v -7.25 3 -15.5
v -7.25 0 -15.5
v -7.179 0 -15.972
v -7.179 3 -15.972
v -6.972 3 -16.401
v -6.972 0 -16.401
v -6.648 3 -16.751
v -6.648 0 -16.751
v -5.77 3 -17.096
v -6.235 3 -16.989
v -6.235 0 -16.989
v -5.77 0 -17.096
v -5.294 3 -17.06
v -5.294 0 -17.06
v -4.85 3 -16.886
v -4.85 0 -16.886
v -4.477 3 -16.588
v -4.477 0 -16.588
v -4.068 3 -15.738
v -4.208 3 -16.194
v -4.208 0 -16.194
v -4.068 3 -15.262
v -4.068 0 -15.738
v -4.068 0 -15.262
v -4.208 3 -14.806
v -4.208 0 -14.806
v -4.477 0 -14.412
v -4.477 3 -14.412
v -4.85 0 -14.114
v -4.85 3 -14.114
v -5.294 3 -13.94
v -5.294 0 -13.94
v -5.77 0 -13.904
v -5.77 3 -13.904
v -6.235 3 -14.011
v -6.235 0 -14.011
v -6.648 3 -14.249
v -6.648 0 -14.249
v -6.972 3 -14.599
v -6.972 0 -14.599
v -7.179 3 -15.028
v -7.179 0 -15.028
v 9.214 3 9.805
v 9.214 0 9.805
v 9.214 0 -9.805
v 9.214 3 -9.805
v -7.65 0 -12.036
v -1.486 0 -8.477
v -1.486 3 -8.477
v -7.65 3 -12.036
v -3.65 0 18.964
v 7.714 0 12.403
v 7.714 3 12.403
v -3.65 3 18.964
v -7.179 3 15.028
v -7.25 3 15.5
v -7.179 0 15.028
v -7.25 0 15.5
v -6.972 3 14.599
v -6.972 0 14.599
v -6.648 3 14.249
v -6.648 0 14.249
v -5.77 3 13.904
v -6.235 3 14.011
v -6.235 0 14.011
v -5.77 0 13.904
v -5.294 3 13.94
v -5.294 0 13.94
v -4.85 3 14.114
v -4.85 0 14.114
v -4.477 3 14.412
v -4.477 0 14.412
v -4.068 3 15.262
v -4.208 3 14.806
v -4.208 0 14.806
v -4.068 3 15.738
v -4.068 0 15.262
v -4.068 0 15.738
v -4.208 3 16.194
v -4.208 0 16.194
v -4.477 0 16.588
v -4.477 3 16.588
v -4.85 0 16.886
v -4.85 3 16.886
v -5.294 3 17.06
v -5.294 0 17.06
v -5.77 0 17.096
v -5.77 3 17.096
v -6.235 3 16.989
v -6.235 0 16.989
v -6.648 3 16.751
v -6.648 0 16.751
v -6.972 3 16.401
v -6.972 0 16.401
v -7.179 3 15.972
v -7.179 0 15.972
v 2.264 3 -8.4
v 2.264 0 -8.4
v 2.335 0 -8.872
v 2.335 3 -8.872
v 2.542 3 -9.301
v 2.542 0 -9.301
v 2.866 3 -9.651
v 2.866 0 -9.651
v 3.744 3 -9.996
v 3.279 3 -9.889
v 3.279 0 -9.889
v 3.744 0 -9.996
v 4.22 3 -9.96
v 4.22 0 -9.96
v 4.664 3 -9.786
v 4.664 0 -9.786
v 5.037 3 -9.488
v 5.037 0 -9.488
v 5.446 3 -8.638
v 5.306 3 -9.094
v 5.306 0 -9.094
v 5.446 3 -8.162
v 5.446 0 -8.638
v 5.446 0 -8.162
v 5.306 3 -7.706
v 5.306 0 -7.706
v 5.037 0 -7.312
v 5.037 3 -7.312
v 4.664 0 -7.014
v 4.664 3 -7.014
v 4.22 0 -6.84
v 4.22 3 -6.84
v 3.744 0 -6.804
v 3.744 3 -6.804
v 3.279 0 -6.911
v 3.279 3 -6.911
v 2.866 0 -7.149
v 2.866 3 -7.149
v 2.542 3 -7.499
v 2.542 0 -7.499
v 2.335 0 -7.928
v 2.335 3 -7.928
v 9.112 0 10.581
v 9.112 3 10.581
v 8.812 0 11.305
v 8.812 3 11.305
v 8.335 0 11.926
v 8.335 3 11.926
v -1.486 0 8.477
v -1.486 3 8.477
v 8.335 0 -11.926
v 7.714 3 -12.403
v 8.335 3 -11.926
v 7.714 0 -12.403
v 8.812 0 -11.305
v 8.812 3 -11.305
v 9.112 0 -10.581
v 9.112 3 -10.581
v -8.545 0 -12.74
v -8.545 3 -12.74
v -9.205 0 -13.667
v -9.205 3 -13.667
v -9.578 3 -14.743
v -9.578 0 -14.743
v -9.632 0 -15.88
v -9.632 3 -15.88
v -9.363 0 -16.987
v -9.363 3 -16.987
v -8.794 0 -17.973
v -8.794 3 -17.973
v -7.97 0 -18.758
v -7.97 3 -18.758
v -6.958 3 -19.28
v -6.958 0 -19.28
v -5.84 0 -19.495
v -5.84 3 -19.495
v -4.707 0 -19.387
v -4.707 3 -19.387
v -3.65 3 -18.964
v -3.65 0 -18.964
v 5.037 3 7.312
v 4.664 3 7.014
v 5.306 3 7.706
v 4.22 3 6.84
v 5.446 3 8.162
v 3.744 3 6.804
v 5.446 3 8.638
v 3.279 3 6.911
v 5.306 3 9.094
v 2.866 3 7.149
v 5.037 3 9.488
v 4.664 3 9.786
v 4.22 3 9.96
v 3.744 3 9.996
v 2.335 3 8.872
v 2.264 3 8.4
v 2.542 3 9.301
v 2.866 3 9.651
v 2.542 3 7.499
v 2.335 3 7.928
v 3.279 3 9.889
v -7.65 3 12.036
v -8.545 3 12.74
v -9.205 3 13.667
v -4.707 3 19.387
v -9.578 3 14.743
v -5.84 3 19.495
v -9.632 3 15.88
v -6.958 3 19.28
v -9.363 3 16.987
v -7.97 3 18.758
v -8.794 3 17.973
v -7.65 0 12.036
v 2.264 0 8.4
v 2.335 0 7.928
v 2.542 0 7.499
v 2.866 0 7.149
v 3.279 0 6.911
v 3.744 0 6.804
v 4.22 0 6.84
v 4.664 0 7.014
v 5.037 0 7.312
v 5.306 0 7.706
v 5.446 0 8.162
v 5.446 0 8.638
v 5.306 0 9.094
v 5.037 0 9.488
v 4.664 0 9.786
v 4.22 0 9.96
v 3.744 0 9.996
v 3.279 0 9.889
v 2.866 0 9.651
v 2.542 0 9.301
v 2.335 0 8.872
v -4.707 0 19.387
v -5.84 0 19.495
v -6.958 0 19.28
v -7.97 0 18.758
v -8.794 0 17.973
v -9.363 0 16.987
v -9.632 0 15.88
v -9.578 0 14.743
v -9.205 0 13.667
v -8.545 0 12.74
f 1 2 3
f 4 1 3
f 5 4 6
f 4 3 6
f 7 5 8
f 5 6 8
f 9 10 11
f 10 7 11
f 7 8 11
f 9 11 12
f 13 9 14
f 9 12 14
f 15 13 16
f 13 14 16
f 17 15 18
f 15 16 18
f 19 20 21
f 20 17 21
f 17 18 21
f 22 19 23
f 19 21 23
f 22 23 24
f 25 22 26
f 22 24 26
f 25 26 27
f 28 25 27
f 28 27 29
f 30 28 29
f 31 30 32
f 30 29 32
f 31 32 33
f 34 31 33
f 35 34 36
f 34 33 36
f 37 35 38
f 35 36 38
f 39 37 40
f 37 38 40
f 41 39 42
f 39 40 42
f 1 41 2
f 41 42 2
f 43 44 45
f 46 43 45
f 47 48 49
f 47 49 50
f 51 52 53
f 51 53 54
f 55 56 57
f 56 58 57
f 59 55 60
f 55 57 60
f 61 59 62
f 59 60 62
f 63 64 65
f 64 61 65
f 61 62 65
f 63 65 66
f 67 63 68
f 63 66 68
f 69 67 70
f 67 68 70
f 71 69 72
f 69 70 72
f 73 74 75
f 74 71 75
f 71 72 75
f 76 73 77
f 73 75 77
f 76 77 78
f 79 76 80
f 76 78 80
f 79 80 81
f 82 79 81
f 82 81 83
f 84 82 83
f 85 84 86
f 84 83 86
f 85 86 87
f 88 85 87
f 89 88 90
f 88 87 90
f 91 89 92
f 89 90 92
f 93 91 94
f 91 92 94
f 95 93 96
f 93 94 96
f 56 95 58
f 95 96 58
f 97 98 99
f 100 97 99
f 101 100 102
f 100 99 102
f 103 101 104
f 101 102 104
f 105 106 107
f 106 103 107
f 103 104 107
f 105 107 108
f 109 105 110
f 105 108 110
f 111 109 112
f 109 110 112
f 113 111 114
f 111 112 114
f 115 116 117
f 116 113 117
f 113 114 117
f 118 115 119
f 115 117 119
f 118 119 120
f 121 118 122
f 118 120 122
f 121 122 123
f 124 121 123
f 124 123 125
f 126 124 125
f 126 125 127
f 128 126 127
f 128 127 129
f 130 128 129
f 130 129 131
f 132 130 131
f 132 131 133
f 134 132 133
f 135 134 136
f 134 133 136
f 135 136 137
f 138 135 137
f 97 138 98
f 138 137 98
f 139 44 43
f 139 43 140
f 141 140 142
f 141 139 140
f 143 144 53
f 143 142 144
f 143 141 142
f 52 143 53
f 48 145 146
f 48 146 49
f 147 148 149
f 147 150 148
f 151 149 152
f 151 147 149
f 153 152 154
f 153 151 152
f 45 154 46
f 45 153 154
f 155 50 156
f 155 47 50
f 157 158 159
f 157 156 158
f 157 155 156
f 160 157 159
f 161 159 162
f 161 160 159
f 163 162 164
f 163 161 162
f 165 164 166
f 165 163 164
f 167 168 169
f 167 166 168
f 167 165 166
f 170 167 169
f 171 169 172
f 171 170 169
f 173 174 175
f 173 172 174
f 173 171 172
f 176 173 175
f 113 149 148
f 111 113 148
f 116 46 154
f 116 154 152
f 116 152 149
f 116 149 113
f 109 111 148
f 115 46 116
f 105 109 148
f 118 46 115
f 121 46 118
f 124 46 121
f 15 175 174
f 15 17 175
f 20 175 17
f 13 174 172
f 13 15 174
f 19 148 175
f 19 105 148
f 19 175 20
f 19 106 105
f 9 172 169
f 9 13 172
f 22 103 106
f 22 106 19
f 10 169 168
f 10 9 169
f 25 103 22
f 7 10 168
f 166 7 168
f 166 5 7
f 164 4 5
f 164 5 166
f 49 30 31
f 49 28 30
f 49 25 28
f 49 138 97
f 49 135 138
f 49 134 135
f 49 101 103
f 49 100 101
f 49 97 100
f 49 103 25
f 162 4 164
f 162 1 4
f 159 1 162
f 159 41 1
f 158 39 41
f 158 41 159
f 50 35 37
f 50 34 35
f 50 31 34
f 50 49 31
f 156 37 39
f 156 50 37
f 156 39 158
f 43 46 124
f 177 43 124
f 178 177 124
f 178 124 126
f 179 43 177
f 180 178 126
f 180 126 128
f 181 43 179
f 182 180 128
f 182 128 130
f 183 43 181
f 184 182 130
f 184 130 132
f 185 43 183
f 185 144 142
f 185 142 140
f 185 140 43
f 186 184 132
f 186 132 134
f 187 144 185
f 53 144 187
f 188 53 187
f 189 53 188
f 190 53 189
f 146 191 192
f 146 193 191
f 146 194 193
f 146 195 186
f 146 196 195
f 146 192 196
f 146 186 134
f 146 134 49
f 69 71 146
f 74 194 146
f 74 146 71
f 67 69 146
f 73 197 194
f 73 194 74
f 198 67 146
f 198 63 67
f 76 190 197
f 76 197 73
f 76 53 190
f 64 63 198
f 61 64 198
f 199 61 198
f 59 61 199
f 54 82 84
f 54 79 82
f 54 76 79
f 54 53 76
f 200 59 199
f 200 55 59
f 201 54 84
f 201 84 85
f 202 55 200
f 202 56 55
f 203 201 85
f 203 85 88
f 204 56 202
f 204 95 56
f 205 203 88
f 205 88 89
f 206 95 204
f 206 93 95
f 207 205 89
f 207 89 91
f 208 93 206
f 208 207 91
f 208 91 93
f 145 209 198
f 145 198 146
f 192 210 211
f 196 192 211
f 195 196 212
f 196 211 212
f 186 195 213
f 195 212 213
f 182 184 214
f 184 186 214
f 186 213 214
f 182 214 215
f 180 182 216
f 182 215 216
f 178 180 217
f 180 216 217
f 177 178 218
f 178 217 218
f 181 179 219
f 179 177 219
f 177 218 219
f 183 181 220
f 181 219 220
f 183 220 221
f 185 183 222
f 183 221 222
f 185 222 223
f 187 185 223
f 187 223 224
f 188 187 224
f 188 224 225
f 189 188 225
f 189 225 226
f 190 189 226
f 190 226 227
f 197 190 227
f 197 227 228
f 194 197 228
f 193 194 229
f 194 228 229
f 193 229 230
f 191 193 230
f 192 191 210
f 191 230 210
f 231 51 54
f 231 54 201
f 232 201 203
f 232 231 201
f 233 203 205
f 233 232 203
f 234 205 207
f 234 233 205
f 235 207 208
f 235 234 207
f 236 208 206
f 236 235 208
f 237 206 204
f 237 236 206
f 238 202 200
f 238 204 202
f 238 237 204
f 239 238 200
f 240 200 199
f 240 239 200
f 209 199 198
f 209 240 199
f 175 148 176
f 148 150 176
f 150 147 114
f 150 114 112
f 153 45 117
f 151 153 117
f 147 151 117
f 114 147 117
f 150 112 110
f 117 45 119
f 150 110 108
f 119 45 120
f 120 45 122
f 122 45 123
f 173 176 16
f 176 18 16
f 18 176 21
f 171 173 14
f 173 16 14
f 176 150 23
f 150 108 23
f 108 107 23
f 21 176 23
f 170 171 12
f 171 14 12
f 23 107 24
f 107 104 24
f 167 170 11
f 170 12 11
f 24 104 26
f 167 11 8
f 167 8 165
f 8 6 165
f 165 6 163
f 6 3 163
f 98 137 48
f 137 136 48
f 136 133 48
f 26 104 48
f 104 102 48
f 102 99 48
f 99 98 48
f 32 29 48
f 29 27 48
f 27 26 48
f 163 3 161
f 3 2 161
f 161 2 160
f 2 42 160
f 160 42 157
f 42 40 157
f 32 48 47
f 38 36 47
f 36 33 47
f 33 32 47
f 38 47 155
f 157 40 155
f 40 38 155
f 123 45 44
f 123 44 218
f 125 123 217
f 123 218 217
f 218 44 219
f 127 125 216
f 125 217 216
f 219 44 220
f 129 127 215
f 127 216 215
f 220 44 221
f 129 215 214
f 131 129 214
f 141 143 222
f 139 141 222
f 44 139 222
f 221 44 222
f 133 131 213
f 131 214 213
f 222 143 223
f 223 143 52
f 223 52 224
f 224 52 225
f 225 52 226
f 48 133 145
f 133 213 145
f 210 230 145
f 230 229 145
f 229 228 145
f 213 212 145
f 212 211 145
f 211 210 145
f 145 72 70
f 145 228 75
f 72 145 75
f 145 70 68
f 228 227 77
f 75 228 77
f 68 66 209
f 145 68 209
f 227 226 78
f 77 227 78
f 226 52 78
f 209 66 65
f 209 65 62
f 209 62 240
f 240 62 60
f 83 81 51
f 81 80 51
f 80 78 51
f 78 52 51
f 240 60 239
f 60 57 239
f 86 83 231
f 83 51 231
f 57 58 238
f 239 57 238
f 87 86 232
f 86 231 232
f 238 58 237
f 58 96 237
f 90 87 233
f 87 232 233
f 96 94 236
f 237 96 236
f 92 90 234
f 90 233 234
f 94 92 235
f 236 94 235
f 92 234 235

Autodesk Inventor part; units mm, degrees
ref_plane "YZ Plane" through (0, 0, 0) normal (1, 0, 0) x (0, 1, 0)
ref_plane "XZ Plane" through (0, 0, 0) normal (0, 1, 0) x (-1, 0, 0)
ref_plane "XY Plane" through (0, 0, 0) normal (0, 0, 1) x (1, 0, 0)
sketch "Sketch1" plane through (0, 0, 0) normal (0, 1, 0) x (-1, 0, 0)
  circle A0 centre (5.65, 15.5) radius 1.6
  circle A1 centre (5.65, -15.5) radius 1.6
  arc A2 (7.65, 12.0359) -> (3.65, 18.9641) centre (5.65, 15.5) ccw
  arc A3 (3.65, -18.9641) -> (7.65, -12.0359) centre (5.65, -15.5) ccw
  line L0 (5.65, 15.5) -> (5.65, -15.5) construction
  circle A4 centre (-3.864, 8.4) radius 1.6
  circle A5 centre (-3.864, -8.4) radius 1.6
  line L1 (15.2493, 0) -> (-13.6973, 0) projected
  line L2 (0, -29.3497) -> (0, 29.3497) projected
  line L3 (-3.864, 8.4) -> (-3.864, -8.4) construction
  line L4 (-3.864, 11.8064) -> (-0.914, 10.1032)
  line L5 (-0.914, 10.1032) -> (-0.914, 6.6968)
  line L6 (-0.914, 6.6968) -> (-3.864, 4.9936)
  line L7 (-3.864, 4.9936) -> (-6.814, 6.6968)
  line L8 (-6.814, 6.6968) -> (-6.814, 10.1032)
  line L9 (-6.814, 10.1032) -> (-3.864, 11.8064)
  line L10 (-3.864, -4.9936) -> (-0.914, -6.6968)
  line L11 (-0.914, -6.6968) -> (-0.914, -10.1032)
  line L12 (-0.914, -10.1032) -> (-3.864, -11.8064)
  line L13 (-3.864, -11.8064) -> (-6.814, -10.1032)
  line L14 (-6.814, -10.1032) -> (-6.814, -6.6968)
  line L15 (-6.814, -6.6968) -> (-3.864, -4.9936)
  line L16 (-9.214, 9.805) -> (-9.214, -9.805)
  line L17 (-7.714, -12.4031) -> (3.65, -18.9641)
  line L18 (-7.714, 12.4031) -> (3.65, 18.9641)
  arc A6 (-7.714, 12.4031) -> (-9.214, 9.805) centre (-6.214, 9.805) ccw
  arc A7 (-9.214, -9.805) -> (-7.714, -12.4031) centre (-6.214, -9.805) ccw
  line L19 (7.65, 12.0359) -> (1.486, 8.4771)
  line L20 (1.486, 8.4771) -> (1.486, -8.4771)
  line L21 (1.486, -8.4771) -> (7.65, -12.0359)
  point P0 (0, 0)
  dimension "d0" = 31
  dimension "d2" = 3.2
  dimension "d3" = 3.2
  dimension "d6" = 8
  dimension "d7" = 8
  dimension "d32" = 16.8
  dimension "d33" = 15.5
  dimension "d34" = 8.4
  dimension "d35" = 5.65
  dimension "d36" = 3.864
  dimension "d37" = 3.2
  dimension "d38" = 3.2
  dimension "d39" = 5.9
  dimension "d40" = 5.9
  dimension "d41" = 2.4
  dimension "d42" = 3
  dimension "d45" = 2.4
extrude "Extrusion5" add sketch "Sketch1" along normal blind 3 contours L19 L20 L1 L2 L18 A2 | L2 L1 L16 A6 L18 | L20 L21 A3 L17 L2 L1 | L2 L17 A7 L16 L1 | L4 L5 L6 L7 L8 L9 | L10 L11 L12 L13 L14 L15
equation "\"d33\" = 0.5 * d0"
equation "\"d34\" = 0.5 * d32"
equation "\"d40\" = d39"
equation "\"d45\" = d41"
properties part number "TestMount"
